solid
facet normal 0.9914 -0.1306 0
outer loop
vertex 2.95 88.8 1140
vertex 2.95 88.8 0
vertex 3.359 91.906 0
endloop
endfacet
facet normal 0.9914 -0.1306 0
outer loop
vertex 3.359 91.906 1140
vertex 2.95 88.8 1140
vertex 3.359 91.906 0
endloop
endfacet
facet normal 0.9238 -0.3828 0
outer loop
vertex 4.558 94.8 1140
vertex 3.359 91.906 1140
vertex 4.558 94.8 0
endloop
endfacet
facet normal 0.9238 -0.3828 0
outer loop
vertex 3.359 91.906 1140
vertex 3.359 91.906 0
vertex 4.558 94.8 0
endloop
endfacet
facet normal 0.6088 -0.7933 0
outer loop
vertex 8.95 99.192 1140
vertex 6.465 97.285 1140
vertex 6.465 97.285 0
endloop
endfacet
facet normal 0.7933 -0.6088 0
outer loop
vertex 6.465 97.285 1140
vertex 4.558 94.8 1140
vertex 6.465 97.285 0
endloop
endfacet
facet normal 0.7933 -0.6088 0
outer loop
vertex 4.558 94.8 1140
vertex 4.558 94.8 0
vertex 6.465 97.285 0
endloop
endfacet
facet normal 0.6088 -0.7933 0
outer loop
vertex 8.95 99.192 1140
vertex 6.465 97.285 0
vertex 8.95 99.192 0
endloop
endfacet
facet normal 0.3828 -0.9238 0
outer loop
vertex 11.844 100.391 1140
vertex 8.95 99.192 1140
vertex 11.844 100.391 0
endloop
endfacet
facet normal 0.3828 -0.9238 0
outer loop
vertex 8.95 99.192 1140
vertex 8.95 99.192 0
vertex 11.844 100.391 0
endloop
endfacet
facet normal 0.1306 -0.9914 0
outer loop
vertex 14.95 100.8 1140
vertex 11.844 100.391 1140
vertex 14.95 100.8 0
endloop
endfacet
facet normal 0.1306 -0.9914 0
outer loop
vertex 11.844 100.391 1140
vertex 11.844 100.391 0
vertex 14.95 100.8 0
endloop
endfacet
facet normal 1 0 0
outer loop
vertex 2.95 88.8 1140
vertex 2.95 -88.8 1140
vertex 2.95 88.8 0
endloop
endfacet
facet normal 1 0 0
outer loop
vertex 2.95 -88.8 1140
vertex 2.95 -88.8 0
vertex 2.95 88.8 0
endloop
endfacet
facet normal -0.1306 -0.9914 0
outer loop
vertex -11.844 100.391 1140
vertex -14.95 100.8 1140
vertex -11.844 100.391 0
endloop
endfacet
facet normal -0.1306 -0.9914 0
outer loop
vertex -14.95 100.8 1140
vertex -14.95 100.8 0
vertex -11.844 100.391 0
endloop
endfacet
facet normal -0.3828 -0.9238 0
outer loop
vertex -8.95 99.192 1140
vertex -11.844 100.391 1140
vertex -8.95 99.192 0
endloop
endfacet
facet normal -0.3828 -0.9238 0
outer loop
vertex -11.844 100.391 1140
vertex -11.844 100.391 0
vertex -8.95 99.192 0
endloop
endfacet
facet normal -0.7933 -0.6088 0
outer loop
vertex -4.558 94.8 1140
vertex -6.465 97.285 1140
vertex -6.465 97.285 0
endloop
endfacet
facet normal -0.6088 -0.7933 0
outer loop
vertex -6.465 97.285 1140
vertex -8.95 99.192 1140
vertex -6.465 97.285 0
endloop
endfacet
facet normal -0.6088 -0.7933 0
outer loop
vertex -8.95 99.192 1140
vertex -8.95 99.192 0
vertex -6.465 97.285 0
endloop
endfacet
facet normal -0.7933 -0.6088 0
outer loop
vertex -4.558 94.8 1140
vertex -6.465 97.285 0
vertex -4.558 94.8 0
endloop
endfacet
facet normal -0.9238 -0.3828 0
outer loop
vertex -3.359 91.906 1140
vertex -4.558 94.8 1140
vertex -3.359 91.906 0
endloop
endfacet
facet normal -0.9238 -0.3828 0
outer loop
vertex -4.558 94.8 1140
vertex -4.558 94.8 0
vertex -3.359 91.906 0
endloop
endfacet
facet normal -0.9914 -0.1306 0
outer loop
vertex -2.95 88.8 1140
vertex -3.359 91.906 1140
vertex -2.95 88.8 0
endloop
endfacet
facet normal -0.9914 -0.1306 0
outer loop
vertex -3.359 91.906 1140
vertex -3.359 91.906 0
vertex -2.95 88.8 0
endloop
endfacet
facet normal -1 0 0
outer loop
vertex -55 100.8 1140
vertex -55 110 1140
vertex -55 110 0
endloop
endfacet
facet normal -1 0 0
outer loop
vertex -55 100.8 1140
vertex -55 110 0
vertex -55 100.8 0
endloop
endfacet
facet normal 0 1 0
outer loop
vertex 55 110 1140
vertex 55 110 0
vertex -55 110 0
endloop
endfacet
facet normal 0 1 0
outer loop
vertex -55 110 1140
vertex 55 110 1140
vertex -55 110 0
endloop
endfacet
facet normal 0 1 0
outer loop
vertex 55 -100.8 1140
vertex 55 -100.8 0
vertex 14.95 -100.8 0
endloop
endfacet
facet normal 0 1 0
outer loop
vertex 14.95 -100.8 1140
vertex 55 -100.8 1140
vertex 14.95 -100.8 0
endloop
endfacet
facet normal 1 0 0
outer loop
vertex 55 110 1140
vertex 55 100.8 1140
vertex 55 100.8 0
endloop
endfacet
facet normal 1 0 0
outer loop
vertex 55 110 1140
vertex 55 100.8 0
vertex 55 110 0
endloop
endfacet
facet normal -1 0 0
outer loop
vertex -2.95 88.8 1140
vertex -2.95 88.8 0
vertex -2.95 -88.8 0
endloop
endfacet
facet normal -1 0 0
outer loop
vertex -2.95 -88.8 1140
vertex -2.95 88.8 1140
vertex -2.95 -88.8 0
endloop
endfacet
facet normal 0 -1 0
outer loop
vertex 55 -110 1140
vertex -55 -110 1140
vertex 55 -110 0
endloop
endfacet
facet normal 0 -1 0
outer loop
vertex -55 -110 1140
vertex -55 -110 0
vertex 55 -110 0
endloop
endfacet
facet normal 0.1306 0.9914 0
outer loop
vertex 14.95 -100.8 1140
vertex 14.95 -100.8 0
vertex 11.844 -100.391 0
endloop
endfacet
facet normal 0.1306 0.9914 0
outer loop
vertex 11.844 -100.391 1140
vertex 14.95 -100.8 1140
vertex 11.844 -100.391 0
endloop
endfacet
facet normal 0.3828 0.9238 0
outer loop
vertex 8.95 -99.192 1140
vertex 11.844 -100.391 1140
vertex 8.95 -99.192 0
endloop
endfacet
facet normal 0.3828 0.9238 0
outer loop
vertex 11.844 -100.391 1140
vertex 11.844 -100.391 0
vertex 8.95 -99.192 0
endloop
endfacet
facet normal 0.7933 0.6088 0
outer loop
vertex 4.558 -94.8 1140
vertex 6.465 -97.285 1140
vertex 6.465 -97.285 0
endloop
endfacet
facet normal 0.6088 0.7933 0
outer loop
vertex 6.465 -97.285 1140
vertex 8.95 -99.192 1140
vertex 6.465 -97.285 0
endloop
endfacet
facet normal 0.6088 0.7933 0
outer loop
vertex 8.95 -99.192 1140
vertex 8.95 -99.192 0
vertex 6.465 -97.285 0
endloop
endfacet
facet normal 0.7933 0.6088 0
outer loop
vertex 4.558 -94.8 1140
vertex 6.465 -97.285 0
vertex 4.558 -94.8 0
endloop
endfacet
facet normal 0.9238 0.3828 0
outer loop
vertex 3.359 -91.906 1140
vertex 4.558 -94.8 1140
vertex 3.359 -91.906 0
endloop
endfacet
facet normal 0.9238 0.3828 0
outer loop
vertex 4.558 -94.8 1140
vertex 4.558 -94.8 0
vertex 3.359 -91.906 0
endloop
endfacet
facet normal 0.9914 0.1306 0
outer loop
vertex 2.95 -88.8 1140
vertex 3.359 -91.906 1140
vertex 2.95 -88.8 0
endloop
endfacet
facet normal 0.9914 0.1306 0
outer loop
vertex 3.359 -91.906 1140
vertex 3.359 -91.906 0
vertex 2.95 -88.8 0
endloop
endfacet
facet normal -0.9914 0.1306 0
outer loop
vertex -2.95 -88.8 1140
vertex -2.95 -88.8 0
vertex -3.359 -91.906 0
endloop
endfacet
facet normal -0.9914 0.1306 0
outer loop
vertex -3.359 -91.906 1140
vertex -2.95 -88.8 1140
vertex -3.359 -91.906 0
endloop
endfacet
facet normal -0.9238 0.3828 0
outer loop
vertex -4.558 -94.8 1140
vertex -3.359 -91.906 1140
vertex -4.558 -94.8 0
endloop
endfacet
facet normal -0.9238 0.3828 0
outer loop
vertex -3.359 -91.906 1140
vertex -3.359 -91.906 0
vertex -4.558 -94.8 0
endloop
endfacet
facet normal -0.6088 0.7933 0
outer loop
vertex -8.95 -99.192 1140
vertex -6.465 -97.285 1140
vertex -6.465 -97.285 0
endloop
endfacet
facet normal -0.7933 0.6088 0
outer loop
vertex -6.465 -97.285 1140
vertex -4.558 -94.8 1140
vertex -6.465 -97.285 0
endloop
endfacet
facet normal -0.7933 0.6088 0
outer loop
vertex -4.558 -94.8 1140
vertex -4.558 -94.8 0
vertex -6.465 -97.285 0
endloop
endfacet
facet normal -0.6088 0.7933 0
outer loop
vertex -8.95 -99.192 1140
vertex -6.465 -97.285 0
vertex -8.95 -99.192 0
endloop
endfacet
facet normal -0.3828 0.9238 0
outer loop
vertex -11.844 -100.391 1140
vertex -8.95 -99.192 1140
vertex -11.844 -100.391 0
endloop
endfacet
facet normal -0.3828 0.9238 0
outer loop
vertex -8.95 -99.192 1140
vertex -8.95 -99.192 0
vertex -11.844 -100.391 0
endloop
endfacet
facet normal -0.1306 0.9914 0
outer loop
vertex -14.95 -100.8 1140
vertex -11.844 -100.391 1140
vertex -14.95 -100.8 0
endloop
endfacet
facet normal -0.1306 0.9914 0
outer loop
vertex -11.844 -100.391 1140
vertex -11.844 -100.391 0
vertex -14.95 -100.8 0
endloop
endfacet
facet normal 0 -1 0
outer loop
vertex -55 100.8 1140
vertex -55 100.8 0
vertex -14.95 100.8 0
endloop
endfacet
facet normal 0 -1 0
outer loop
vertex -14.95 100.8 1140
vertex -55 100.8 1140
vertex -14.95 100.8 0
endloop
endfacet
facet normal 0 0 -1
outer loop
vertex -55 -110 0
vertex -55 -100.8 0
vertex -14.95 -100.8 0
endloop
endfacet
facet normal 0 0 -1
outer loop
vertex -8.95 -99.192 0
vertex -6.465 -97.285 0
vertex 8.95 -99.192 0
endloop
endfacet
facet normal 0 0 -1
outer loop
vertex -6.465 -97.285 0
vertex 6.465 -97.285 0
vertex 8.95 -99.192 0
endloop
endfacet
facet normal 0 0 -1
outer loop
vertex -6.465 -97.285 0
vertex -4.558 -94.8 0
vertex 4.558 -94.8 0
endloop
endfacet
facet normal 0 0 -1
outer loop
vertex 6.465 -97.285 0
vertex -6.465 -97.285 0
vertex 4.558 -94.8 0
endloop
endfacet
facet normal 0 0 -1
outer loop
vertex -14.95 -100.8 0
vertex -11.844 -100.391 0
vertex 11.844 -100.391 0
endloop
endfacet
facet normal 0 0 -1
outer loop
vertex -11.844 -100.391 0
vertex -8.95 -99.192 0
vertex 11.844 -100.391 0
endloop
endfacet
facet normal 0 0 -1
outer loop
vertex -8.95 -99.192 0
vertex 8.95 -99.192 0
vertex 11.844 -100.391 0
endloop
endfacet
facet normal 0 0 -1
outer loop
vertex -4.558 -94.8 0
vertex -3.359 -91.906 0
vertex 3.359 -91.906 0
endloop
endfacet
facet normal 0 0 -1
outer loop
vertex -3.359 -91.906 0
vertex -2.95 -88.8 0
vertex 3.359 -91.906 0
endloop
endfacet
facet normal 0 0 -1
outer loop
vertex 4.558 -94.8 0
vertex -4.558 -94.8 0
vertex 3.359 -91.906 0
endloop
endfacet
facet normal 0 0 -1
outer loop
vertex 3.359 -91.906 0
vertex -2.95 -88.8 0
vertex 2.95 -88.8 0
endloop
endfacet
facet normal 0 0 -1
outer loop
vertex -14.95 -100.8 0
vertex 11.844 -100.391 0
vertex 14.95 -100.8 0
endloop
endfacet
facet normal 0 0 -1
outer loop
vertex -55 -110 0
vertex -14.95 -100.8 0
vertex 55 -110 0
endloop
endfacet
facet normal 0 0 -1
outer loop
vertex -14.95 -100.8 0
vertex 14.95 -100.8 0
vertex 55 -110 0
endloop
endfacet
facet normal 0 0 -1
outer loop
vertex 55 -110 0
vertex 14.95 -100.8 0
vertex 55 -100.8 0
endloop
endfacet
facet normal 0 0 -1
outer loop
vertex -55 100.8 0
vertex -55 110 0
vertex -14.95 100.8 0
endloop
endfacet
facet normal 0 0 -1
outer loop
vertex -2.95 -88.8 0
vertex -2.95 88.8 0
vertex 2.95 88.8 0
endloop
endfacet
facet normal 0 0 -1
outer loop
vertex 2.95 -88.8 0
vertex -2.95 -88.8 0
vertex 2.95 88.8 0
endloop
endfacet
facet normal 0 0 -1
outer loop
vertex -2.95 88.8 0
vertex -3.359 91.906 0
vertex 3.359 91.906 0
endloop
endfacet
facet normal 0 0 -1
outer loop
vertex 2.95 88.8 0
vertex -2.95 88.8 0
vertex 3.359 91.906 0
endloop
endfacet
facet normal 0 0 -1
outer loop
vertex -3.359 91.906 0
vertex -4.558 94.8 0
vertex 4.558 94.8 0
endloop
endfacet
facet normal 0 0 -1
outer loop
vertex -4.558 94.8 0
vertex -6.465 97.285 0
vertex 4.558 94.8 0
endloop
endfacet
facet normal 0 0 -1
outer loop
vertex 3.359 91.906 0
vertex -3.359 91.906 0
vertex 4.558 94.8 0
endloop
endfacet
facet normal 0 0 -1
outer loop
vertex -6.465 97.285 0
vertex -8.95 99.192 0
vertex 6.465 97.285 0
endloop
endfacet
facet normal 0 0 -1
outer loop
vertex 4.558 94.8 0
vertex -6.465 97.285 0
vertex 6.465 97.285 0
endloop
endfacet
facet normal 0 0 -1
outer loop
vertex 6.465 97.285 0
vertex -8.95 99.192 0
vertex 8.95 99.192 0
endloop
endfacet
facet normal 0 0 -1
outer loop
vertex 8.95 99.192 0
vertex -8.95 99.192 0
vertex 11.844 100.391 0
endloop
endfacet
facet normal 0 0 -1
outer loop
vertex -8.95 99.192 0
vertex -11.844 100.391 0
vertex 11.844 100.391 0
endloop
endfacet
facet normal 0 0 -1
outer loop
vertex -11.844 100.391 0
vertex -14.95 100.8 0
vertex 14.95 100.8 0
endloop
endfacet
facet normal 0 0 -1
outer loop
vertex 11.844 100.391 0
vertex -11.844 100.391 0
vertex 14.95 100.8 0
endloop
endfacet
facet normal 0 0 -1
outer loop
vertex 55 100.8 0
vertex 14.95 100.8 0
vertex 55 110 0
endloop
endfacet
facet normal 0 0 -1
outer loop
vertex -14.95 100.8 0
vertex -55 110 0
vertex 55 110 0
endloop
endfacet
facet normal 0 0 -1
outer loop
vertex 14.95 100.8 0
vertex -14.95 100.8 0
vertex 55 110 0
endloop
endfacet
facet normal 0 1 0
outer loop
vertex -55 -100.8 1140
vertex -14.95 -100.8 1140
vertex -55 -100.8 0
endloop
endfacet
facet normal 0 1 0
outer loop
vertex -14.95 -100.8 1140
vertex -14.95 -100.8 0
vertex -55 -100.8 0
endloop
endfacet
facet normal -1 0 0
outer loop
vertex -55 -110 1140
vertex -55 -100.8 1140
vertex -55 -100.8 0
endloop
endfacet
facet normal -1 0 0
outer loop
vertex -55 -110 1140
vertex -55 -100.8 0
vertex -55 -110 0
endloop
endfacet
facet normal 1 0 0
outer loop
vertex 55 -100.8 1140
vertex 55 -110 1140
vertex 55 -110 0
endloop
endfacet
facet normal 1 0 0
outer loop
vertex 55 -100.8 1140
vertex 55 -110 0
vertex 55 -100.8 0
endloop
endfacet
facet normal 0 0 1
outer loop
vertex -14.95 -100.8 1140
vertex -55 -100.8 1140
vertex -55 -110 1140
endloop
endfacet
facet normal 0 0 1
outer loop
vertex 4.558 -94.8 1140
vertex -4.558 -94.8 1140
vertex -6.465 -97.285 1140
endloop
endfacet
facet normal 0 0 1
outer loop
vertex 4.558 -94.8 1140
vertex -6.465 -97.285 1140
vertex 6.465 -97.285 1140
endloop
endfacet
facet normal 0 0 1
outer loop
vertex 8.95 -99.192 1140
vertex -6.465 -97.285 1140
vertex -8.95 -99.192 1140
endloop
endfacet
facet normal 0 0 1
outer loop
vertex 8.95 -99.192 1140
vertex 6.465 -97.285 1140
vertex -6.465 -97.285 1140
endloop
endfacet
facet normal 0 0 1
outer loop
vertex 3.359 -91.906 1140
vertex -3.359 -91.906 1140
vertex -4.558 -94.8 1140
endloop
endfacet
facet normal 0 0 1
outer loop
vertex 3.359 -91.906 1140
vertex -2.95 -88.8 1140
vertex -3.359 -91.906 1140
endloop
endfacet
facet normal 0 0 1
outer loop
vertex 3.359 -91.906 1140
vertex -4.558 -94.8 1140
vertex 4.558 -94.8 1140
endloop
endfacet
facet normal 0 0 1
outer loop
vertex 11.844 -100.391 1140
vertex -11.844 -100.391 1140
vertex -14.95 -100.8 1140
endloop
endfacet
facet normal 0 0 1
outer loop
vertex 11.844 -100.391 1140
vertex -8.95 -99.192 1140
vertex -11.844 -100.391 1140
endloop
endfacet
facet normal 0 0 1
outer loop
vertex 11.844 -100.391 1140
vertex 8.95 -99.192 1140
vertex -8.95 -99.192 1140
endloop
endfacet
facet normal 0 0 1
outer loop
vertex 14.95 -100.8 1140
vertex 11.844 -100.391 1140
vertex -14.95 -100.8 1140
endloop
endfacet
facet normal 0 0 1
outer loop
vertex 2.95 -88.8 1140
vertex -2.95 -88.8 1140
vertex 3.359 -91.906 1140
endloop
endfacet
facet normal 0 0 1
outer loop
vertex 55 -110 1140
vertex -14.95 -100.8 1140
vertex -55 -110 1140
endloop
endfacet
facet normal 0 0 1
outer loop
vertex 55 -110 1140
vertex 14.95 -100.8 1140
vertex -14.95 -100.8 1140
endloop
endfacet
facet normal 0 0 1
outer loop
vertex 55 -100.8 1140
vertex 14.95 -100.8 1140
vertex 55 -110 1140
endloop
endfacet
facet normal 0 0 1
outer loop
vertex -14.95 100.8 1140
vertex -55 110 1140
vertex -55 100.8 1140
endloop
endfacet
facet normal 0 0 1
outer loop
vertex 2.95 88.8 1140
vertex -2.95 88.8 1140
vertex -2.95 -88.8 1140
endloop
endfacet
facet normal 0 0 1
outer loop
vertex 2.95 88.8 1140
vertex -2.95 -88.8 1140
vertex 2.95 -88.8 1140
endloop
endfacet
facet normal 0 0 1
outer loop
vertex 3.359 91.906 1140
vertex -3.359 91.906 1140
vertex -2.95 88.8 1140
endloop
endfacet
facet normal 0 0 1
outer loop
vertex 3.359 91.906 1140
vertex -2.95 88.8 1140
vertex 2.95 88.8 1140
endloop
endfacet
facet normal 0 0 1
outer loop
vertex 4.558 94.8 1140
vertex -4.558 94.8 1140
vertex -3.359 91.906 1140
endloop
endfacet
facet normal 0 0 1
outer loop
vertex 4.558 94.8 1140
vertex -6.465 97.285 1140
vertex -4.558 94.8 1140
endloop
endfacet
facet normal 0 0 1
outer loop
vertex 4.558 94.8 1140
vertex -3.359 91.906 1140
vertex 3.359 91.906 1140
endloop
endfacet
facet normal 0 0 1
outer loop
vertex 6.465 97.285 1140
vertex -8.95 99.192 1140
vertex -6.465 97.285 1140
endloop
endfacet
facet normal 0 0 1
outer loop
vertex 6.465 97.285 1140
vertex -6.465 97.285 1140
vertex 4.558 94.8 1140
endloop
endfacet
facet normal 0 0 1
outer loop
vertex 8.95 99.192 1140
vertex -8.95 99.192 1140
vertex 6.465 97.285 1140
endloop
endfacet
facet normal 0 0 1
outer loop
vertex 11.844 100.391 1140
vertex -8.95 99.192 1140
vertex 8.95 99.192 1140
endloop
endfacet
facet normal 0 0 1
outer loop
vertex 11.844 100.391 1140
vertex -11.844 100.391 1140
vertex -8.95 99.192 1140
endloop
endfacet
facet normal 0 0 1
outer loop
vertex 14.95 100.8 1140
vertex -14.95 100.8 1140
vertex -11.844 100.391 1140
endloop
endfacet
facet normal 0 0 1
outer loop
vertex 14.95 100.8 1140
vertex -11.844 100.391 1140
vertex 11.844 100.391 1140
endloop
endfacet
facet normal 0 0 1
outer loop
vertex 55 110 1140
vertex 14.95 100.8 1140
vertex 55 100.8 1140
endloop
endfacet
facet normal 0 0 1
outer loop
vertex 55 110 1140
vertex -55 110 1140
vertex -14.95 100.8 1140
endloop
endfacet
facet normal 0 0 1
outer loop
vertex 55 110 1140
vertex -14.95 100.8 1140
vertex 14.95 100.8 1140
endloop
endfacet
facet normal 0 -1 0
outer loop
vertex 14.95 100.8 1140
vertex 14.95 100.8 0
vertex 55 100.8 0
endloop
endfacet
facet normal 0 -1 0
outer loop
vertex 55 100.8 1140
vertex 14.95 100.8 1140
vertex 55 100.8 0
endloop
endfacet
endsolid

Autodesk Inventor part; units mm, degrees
ref_plane "Start plane" through (0, 0, 0) normal (0, 0, 1) x (1, 0, 0)
ref_plane "End plane" through (0, 0, 1140) normal (0, 0, 1) x (1, 0, 0)
sketch "Sketch2" plane through (0, 0, 0) normal (0, 0, 1) x (1, 0, 0)
  line L0 (-55, 100.8) -> (-14.95, 100.8)
  line L1 (-55, 110) -> (-55, 100.8)
  line L2 (55, 110) -> (-55, 110)
  line L3 (55, 100.8) -> (55, 110)
  line L4 (14.95, 100.8) -> (55, 100.8)
  line L5 (2.95, -88.8) -> (2.95, 88.8)
  line L6 (55, -100.8) -> (14.95, -100.8)
  line L7 (55, -110) -> (55, -100.8)
  line L8 (-55, -100.8) -> (-55, -110)
  line L9 (-14.95, -100.8) -> (-55, -100.8)
  line L10 (-2.95, 88.8) -> (-2.95, -88.8)
  line L11 (0, -154) -> (0, 154) construction
  line L12 (-2.95, -100.8) -> (2.95, -100.8) construction
  arc A0 (-14.95, -100.8) -> (-2.95, -88.8) centre (-14.95, -88.8) ccw
  arc A1 (-2.95, 88.8) -> (-14.95, 100.8) centre (-14.95, 88.8) ccw
  arc A2 (14.95, 100.8) -> (2.95, 88.8) centre (14.95, 88.8) ccw
  arc A3 (2.95, -88.8) -> (14.95, -100.8) centre (14.95, -88.8) ccw
  line L13 (-77, 0) -> (77, 0) construction
  line L14 (-55, -110) -> (55, -110)
  point P0 (-2.95, 100.8)
  point P1 (2.95, 100.8)
  point P2 (0, 0)
  point P3 (0, -100.8)
  point P4 (0, 0)
  dimension "d1" = 220
  dimension "d3" = 9.2
  dimension "d5" = 5.9
  dimension "d7" = 110
  dimension "d13" = 12
  dimension "d14" = 110
  dimension "d15" = 55
extrude "Body" add sketch "Sketch2" along normal up to surface (1140 mm away) from surface at 0
sketch "Sketch3" plane through (0, 0, 0) normal (0, 0, 1) x (1, 0, 0)
  line L0 (0, 0) -> (10, 0)
ref_plane "Work Plane3" through (0, 0, 0) normal (0, -1, 0) x (1, 0, 0)
ref_plane "Work Plane4" through (-85, 0, 1140) normal (0, 0, 1) x (1, 0, 0)
split "Split1" plane through (-85, 0, 1140) removes the side toward (0, 0, 1)
sketch "Sketch4" plane through (0, 0, 0) normal (0, -1, 0) x (1, 0, 0)
  line L0 (-2, 0) -> (12, 0) projected
  line L1 (-2, 1140) -> (12, 1140) projected
  dimension "d19" = 1140
equation "\"d1\" = ParH"
equation "\"d3\" = t2"
equation "\"d5\" = t1"
equation "\"d7\" = b"
equation "\"d13\" = R1"
equation "\"d14\" = 0.5 * d1"
equation "\"d15\" = 0.5 * d7"
equation "\"d8\" = G_L"
equation "\"b\" = 110"
equation "\"ParH\" = 220"
equation "\"R1\" = 12"
equation "\"G_L\" = d19"
equation "\"t1\" = 5.9"
equation "\"t2\" = 9.2"
equation "\"G_OFFSET_START\" = 0"
properties part number "DIN 1025 - IPE 220-1140" material "Steel, Mild"
